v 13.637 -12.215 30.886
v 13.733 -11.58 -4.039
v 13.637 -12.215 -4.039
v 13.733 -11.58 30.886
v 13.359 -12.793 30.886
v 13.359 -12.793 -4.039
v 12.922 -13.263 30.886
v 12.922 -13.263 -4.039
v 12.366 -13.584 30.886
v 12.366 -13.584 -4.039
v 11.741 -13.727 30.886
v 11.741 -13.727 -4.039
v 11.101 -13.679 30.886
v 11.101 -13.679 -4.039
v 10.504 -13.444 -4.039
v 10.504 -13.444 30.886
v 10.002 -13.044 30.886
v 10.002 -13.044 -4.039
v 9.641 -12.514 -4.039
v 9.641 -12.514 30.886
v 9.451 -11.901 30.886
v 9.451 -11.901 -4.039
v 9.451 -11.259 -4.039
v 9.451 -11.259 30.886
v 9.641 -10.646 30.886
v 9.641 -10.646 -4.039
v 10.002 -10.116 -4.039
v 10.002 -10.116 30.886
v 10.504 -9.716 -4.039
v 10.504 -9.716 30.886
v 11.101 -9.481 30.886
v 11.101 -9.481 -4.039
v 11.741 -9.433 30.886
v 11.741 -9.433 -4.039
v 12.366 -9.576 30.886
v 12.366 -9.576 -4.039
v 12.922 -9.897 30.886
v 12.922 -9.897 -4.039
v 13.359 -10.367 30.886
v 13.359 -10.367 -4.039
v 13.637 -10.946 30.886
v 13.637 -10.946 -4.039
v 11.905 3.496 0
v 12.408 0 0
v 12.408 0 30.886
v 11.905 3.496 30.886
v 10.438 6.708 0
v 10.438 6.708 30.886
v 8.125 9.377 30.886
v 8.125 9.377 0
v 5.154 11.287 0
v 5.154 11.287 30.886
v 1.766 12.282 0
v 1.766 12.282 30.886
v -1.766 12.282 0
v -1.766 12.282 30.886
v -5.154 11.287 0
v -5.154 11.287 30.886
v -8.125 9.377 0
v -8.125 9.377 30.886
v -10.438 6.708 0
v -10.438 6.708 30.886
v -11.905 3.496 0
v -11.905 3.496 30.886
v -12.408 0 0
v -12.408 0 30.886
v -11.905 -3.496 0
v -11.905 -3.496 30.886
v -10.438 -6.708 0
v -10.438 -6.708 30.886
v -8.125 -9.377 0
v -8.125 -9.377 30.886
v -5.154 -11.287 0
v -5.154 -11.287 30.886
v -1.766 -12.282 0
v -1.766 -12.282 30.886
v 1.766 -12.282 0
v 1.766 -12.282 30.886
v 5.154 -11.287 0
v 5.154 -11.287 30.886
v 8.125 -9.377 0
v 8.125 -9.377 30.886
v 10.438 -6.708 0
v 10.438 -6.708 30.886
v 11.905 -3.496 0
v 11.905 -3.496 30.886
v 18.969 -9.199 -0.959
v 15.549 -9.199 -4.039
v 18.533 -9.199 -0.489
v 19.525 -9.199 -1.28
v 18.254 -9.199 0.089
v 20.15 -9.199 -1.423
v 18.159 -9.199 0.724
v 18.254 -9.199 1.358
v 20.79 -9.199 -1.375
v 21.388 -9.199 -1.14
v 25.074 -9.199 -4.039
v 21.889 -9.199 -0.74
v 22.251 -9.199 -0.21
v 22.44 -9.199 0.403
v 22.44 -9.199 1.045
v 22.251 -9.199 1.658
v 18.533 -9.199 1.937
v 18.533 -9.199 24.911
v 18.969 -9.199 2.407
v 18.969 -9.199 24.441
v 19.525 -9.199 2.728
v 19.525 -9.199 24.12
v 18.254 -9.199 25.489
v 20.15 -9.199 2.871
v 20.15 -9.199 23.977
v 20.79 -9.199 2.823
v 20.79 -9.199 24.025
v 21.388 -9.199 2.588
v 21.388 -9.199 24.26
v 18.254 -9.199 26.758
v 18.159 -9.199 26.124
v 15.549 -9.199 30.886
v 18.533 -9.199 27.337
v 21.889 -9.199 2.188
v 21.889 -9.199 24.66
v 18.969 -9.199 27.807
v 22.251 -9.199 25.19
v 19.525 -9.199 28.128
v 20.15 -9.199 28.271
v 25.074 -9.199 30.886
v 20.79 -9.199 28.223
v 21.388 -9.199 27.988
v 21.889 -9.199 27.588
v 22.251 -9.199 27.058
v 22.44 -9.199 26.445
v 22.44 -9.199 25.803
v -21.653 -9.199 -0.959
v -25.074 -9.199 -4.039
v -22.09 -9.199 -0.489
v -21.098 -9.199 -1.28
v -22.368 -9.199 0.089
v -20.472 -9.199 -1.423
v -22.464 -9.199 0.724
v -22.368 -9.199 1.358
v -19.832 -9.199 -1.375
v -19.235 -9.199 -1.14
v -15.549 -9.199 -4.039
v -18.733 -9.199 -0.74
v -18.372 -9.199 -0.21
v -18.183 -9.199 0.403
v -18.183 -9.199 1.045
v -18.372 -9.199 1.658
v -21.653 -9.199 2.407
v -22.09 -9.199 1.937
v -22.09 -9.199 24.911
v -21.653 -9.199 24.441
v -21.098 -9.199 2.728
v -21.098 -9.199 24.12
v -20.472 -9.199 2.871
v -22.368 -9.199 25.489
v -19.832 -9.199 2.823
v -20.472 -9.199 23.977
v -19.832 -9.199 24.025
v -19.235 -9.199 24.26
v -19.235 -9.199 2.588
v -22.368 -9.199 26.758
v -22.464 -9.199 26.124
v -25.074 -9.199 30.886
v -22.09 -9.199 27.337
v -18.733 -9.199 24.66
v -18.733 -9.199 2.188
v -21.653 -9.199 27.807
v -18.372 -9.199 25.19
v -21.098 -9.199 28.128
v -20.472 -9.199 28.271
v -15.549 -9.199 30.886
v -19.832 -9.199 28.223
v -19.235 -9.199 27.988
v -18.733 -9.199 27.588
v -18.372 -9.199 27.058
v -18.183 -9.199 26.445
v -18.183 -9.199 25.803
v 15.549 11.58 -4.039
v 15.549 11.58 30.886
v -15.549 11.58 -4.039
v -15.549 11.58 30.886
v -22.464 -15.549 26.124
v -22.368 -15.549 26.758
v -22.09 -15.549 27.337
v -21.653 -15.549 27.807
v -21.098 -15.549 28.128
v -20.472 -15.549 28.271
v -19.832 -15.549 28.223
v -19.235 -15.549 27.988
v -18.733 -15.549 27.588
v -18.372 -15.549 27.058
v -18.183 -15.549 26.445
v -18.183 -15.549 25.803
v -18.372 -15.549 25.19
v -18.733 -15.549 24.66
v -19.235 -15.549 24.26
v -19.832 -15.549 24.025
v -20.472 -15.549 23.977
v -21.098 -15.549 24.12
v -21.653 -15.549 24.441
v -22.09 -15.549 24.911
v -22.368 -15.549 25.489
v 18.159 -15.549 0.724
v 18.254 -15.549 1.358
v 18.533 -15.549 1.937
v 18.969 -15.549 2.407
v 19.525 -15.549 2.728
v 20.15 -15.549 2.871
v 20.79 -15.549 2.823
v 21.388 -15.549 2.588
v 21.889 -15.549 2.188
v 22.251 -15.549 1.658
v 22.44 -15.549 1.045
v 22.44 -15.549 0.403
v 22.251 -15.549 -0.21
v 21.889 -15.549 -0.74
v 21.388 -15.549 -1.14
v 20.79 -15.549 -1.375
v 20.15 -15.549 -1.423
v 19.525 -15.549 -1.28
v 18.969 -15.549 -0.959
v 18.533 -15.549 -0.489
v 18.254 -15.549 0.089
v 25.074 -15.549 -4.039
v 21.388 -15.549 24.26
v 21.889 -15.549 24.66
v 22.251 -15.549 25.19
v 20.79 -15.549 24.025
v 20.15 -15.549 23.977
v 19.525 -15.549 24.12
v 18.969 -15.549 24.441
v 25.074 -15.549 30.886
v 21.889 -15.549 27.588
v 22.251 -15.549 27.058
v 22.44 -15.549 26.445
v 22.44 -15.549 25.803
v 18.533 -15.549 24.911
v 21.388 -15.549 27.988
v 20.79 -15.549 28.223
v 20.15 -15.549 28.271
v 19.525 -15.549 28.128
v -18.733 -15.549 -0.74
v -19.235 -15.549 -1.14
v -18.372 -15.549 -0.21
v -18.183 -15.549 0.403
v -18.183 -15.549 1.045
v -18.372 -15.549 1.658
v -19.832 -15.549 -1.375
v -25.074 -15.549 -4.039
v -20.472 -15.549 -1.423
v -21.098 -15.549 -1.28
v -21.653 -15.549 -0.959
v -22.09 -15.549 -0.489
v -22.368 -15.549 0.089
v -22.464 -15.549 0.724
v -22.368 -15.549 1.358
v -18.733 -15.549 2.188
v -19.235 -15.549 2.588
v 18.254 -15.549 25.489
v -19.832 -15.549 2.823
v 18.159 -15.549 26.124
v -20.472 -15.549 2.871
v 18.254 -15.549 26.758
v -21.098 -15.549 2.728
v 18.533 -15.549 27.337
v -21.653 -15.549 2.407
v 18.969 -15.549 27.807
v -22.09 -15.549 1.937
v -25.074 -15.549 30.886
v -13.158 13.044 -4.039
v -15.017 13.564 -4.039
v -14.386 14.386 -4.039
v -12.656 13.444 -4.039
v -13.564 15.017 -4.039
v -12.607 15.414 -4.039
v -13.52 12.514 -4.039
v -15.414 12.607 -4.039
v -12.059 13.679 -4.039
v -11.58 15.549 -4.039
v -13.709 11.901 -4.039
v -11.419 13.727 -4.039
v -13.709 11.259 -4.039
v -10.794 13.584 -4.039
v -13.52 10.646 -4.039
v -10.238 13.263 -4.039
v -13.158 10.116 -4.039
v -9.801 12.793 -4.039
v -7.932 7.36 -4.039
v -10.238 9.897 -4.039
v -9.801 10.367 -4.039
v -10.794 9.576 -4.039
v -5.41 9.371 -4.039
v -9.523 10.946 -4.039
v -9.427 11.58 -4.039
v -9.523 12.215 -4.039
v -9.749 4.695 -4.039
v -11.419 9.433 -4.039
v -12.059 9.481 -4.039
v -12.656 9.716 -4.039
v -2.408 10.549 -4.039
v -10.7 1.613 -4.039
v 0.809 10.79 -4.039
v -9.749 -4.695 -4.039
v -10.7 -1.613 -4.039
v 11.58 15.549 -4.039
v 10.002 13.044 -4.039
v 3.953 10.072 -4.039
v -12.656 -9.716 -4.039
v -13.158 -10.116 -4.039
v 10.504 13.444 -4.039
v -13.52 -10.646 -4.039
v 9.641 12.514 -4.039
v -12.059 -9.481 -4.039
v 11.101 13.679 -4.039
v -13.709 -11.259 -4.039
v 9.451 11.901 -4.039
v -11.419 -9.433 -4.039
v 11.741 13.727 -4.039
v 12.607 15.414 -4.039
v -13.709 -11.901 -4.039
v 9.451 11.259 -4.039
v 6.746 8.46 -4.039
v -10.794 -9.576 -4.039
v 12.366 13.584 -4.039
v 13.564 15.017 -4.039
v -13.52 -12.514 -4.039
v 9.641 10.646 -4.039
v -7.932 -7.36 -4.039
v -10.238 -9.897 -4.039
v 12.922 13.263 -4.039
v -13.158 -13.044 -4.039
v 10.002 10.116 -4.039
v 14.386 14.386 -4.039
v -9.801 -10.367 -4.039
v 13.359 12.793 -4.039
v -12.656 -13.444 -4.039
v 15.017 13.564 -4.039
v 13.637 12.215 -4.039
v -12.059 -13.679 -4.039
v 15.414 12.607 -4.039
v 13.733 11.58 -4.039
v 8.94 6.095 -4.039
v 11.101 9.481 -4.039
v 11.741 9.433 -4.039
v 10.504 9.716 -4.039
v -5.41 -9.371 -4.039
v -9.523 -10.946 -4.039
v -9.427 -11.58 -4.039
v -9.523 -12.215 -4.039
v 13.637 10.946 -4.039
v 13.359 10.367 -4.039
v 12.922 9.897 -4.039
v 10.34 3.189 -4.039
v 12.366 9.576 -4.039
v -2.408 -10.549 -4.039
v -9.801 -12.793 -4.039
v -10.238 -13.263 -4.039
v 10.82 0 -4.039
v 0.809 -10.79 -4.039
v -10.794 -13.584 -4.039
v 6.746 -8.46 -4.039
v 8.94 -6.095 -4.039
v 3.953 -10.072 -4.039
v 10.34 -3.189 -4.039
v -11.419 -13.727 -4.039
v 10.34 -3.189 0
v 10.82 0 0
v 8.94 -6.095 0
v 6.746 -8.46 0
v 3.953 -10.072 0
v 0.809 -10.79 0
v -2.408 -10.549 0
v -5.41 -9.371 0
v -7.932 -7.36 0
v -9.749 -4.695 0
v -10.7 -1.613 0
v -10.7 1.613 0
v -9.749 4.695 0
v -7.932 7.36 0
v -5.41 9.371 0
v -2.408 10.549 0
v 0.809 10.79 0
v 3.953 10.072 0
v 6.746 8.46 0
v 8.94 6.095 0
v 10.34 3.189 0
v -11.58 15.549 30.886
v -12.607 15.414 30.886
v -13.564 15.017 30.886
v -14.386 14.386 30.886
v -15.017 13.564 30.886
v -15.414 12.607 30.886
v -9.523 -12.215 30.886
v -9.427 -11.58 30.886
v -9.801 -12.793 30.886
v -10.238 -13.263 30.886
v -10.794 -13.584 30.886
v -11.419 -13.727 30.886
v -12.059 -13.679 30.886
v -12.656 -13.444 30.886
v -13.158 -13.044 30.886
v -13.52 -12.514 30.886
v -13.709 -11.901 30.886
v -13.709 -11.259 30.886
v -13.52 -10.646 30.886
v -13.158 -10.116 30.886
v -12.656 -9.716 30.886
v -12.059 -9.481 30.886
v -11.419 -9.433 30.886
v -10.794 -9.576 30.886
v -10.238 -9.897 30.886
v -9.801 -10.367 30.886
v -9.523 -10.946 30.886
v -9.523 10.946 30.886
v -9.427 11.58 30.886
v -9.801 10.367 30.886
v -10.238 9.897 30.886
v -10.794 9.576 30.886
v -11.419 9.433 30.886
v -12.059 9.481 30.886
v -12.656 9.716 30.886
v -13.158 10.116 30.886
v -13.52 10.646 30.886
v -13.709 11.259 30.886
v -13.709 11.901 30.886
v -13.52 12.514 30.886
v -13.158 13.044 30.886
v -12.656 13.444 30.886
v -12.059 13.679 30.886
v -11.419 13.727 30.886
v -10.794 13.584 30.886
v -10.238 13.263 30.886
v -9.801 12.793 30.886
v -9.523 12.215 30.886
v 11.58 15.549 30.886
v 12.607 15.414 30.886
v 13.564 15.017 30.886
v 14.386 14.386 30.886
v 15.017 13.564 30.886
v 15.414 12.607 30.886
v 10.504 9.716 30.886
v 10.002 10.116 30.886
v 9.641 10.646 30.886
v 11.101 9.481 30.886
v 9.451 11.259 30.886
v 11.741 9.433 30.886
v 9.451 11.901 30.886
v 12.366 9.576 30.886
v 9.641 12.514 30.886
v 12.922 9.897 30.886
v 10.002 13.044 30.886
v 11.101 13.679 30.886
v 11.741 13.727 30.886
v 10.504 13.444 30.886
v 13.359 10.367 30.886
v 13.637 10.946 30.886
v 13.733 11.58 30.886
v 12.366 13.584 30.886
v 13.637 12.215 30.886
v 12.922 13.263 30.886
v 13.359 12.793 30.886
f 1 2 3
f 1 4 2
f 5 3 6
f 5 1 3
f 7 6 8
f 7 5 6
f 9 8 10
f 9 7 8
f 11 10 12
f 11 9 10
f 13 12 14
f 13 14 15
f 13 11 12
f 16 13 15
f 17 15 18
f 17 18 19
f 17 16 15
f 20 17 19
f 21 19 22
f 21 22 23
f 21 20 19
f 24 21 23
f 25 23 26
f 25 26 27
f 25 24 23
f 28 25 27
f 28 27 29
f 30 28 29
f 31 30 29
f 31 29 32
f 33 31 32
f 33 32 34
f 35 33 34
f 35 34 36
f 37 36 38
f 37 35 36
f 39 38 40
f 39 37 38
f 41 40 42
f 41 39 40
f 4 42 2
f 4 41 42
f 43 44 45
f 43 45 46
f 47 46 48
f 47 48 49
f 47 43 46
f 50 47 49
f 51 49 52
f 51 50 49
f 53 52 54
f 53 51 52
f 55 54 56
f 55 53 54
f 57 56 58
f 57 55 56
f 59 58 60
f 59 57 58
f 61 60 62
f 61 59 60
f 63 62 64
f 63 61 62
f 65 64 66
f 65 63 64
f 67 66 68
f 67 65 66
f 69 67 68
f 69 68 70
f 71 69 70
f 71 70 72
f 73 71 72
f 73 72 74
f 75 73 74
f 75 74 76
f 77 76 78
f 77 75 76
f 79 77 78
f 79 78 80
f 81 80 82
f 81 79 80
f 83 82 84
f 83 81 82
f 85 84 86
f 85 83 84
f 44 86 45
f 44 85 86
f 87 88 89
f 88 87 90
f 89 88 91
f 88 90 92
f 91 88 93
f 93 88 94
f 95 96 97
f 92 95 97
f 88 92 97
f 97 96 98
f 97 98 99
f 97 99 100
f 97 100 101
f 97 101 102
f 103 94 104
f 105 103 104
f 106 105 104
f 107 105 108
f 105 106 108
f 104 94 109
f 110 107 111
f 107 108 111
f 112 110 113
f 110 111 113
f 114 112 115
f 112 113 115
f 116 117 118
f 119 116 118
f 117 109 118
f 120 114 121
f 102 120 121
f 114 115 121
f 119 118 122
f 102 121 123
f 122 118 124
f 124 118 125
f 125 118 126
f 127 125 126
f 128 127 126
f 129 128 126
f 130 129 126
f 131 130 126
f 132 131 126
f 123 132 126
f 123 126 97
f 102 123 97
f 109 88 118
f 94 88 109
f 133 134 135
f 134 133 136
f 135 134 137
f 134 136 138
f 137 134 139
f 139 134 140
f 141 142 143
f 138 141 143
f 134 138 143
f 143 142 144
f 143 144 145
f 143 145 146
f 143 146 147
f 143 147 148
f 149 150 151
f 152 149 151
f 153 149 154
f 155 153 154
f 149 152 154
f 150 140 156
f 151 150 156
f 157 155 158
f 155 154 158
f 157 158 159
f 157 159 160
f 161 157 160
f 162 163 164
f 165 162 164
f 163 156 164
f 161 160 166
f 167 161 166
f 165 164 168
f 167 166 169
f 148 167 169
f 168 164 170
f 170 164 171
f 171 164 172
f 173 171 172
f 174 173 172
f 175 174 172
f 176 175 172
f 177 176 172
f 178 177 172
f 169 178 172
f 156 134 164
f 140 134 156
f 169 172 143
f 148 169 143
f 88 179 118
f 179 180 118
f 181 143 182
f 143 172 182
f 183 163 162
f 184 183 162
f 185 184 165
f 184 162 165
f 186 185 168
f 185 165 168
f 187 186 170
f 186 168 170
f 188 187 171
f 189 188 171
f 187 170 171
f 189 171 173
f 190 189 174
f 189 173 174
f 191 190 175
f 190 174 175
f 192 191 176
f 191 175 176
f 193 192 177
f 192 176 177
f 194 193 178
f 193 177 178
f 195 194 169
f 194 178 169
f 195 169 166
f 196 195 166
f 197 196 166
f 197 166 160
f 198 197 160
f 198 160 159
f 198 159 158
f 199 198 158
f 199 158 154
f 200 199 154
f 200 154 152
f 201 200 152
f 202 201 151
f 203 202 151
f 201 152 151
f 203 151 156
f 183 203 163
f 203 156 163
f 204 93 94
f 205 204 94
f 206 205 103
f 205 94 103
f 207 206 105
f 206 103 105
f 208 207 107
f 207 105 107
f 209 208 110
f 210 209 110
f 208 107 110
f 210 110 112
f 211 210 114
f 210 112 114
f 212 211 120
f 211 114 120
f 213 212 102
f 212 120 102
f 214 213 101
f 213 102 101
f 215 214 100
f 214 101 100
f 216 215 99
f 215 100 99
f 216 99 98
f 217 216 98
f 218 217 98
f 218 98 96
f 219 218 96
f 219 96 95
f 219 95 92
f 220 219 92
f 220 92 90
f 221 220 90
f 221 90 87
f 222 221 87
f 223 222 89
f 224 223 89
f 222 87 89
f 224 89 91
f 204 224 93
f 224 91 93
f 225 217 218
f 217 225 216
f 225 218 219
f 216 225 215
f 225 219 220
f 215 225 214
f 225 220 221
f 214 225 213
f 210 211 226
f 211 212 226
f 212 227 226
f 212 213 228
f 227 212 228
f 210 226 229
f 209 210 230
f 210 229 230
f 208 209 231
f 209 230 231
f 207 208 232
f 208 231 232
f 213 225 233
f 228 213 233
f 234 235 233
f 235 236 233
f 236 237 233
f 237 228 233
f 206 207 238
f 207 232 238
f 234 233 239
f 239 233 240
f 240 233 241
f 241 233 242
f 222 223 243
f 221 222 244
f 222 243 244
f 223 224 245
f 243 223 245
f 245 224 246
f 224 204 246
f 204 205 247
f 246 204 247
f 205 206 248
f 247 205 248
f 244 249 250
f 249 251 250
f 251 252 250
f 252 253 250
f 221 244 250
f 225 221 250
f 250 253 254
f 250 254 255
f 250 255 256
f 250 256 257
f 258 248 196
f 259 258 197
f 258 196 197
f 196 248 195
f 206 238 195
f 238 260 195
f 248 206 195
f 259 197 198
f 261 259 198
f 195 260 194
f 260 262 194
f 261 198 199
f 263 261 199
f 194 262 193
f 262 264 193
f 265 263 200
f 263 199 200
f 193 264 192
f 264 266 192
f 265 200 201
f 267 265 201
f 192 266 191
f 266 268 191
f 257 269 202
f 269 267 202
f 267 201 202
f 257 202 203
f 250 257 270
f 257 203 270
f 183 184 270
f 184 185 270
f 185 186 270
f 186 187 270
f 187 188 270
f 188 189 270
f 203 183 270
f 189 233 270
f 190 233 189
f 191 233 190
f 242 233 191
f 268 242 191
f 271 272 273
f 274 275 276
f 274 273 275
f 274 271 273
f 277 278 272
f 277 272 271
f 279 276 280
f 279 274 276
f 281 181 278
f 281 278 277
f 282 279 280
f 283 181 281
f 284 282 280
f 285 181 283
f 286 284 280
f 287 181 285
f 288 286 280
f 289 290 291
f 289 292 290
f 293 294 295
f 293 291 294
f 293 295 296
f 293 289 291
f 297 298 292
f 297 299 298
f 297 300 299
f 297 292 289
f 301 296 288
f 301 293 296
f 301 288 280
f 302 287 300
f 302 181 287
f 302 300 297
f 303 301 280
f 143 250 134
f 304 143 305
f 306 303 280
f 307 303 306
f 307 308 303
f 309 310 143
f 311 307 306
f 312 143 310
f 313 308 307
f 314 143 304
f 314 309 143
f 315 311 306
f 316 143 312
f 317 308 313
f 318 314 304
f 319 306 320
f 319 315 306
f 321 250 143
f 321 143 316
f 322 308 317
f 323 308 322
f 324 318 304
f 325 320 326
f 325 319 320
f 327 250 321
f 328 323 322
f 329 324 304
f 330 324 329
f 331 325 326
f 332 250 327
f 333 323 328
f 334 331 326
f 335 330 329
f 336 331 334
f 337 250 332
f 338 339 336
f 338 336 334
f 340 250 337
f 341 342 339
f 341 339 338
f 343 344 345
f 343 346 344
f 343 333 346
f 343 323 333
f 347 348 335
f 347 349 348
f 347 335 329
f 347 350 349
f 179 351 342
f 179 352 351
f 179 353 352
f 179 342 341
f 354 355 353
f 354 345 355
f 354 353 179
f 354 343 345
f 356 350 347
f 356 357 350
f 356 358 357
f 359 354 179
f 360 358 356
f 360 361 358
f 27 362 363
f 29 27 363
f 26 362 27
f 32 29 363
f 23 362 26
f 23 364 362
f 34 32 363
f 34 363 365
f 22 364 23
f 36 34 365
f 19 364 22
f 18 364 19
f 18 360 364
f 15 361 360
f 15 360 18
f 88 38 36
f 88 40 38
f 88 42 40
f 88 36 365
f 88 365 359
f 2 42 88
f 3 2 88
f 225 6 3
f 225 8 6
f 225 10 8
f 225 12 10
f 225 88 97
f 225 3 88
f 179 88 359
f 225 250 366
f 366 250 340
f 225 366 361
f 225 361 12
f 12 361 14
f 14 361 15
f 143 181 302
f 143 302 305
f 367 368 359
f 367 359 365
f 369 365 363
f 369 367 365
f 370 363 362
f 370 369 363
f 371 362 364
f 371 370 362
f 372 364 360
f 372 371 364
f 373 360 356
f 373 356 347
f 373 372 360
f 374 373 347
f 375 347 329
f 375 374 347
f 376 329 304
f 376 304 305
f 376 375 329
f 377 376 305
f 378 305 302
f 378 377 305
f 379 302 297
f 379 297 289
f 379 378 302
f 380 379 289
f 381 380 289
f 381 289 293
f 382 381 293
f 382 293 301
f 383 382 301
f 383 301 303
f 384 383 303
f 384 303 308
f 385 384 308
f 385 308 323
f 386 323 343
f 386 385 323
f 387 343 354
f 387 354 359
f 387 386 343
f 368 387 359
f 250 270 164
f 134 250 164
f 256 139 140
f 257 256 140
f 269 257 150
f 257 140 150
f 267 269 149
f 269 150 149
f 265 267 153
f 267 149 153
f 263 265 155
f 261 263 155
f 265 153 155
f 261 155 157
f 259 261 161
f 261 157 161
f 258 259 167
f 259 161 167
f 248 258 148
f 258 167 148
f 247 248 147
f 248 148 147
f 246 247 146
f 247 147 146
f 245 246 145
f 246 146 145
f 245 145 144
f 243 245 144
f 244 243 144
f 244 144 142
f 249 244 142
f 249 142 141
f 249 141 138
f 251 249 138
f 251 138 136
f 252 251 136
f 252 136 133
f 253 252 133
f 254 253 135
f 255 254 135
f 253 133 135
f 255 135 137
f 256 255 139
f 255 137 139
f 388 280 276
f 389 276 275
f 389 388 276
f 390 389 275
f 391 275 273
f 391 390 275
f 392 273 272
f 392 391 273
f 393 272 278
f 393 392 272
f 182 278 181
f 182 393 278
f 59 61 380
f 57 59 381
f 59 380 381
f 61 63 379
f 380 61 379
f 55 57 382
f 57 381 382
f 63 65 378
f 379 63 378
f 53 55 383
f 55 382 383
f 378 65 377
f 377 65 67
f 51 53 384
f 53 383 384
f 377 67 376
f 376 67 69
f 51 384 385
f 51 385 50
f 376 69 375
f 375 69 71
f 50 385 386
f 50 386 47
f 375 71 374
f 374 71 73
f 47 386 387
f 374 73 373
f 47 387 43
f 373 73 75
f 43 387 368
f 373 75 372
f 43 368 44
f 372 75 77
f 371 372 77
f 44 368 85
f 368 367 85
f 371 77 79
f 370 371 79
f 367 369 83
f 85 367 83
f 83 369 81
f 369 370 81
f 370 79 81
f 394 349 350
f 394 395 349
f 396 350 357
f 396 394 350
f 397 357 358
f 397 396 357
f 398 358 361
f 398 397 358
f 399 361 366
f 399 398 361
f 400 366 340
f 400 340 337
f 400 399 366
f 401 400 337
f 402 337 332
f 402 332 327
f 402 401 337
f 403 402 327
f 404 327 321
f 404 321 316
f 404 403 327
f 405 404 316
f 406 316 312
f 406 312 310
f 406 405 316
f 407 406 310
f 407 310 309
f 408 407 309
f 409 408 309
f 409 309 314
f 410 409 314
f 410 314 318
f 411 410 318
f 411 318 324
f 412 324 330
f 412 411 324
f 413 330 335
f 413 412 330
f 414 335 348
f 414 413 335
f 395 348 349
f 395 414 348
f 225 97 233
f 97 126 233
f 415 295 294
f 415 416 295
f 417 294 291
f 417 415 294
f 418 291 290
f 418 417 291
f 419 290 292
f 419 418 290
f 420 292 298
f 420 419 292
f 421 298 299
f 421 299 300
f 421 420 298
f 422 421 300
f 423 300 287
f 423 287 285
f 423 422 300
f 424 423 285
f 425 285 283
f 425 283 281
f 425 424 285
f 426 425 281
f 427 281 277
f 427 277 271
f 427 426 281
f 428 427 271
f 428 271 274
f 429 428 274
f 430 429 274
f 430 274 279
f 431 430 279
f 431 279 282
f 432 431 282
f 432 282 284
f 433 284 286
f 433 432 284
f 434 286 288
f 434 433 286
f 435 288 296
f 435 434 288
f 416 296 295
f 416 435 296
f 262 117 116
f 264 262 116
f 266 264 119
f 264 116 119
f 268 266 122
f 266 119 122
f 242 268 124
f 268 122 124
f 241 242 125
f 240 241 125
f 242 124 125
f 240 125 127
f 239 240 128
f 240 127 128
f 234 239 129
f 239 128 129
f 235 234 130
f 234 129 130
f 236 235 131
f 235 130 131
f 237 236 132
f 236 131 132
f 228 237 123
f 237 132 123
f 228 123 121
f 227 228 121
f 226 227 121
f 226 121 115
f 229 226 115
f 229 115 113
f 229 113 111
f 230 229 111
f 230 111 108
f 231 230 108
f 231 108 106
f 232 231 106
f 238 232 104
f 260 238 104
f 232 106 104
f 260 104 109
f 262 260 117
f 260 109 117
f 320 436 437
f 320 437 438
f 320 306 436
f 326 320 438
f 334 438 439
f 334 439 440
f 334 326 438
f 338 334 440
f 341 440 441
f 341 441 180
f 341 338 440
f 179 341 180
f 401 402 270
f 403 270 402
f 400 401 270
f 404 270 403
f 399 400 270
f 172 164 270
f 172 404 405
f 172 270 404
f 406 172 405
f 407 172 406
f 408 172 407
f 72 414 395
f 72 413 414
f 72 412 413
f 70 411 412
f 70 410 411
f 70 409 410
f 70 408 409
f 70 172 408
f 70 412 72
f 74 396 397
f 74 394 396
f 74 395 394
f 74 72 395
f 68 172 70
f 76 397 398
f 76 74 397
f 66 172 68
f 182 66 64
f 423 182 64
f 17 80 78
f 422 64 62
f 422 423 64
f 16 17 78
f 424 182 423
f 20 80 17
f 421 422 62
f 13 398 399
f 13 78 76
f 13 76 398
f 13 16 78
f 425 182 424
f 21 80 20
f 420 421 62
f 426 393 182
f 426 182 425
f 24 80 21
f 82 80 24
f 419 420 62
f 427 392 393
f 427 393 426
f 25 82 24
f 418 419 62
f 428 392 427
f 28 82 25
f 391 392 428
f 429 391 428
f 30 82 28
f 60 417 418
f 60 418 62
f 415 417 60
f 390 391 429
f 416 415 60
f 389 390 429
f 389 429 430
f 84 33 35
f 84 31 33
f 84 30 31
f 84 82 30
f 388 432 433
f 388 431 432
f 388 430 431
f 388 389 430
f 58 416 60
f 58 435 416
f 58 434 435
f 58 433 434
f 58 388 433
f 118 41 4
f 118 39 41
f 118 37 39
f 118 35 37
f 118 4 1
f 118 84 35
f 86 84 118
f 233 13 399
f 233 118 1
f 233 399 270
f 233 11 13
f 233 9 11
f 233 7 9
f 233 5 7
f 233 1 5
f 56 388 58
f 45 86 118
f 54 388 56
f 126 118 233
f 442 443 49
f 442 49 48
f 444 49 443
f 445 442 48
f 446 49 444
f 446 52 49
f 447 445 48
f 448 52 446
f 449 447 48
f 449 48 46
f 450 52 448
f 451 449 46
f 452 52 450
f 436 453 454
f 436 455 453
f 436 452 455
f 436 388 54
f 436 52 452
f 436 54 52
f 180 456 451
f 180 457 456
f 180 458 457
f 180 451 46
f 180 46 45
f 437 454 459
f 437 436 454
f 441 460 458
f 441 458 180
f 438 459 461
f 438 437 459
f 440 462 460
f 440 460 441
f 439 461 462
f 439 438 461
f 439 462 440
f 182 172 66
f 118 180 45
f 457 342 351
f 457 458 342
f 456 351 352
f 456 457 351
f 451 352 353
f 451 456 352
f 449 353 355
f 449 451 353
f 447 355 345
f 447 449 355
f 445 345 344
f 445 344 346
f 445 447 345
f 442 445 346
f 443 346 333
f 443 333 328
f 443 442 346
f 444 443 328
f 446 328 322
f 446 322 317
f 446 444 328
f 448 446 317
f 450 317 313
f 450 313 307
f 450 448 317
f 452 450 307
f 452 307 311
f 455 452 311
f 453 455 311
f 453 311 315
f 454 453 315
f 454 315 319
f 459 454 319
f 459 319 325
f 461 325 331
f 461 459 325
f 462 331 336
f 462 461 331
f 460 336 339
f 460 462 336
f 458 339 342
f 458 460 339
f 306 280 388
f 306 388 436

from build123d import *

# Parameters (mm, degrees)
F0_R     = 2.15265
F0_R_2   = 12.4079
F1_DEPTH = 30.8864
F2_R     = 2.15265
F2_R_2   = 12.4079
F2_R_3   = 10.8204
F3_DEPTH = 4.0386
F4_R     = 2.15265
F5_DEPTH = 6.35
F6_R     = 3.96875


with BuildPart() as f1:
    # F0 (on Top) → F1 (new body)
    with BuildSketch(Plane.XY):
        Polygon((15.5487902681, 15.5487902681), (-15.5487902681, 15.5487902681), (-15.5487902681, -9.1987902681), (-25.0737902681, -9.1987902681), (-25.0737902681, -15.5487902681), (25.0737902681, -15.5487902681), (25.0737902681, -9.1987902681), (15.5487902681, -9.1987902681), align=None)
        with Locations((-11.5800402681, -11.5800402681)):
            Circle(F0_R, mode=Mode.SUBTRACT)
        with Locations((11.5800402681, -11.5800402681)):
            Circle(F0_R, mode=Mode.SUBTRACT)
        with Locations((-11.5800402681, 11.5800402681)):
            Circle(F0_R, mode=Mode.SUBTRACT)
        Circle(F0_R_2, mode=Mode.SUBTRACT)
        with Locations((11.5800402681, 11.5800402681)):
            Circle(F0_R, mode=Mode.SUBTRACT)
    extrude(amount=F1_DEPTH)

    # F2 (on face) → F3 (join)
    with BuildSketch(Plane(origin=(0, 0, 0), x_dir=(1, 0, 0), z_dir=(0, 0, -1))):
        Polygon((-15.5487902681, -15.5487902681), (15.5487902681, -15.5487902681), (15.5487902681, 9.1987902681), (25.0737902681, 9.1987902681), (25.0737902681, 15.5487902681), (-25.0737902681, 15.5487902681), (-25.0737902681, 9.1987902681), (-15.5487902681, 9.1987902681), align=None)
        with Locations((-11.5800402681, -11.5800402681)):
            Circle(F2_R, mode=Mode.SUBTRACT)
        with Locations((11.5800402681, -11.5800402681)):
            Circle(F2_R, mode=Mode.SUBTRACT)
        with Locations((-11.5800402681, 11.5800402681)):
            Circle(F2_R, mode=Mode.SUBTRACT)
        Circle(F2_R_2, mode=Mode.SUBTRACT)
        with Locations((11.5800402681, 11.5800402681)):
            Circle(F2_R, mode=Mode.SUBTRACT)
        Circle(F2_R_2)
        Circle(F2_R_3, mode=Mode.SUBTRACT)
    extrude(amount=F3_DEPTH)

    # F4 (on face) → F5 (cut, through all)
    with BuildSketch(Plane(origin=(0, -9.1987902681, 0), x_dir=(-1, 0, 0), z_dir=(0, 1, 0))):
        with Locations((-20.3112902681, 0.7239)):
            Circle(F4_R)
        with Locations((-20.3112902681, 26.1239)):
            Circle(F4_R)
        with Locations((20.3112902681, 26.1239)):
            Circle(F4_R)
        with Locations((20.3112902681, 0.7239)):
            Circle(F4_R)
    extrude(amount=-F5_DEPTH, mode=Mode.SUBTRACT)

    # F6
    f6_edges = [f1.edges().sort_by_distance(p)[0] for p in [
        (-15.54879, 15.54879, 13.4239),
        (15.54879, 15.54879, 13.4239),
    ]]
    fillet(f6_edges, radius=F6_R)


solid = f1.part
